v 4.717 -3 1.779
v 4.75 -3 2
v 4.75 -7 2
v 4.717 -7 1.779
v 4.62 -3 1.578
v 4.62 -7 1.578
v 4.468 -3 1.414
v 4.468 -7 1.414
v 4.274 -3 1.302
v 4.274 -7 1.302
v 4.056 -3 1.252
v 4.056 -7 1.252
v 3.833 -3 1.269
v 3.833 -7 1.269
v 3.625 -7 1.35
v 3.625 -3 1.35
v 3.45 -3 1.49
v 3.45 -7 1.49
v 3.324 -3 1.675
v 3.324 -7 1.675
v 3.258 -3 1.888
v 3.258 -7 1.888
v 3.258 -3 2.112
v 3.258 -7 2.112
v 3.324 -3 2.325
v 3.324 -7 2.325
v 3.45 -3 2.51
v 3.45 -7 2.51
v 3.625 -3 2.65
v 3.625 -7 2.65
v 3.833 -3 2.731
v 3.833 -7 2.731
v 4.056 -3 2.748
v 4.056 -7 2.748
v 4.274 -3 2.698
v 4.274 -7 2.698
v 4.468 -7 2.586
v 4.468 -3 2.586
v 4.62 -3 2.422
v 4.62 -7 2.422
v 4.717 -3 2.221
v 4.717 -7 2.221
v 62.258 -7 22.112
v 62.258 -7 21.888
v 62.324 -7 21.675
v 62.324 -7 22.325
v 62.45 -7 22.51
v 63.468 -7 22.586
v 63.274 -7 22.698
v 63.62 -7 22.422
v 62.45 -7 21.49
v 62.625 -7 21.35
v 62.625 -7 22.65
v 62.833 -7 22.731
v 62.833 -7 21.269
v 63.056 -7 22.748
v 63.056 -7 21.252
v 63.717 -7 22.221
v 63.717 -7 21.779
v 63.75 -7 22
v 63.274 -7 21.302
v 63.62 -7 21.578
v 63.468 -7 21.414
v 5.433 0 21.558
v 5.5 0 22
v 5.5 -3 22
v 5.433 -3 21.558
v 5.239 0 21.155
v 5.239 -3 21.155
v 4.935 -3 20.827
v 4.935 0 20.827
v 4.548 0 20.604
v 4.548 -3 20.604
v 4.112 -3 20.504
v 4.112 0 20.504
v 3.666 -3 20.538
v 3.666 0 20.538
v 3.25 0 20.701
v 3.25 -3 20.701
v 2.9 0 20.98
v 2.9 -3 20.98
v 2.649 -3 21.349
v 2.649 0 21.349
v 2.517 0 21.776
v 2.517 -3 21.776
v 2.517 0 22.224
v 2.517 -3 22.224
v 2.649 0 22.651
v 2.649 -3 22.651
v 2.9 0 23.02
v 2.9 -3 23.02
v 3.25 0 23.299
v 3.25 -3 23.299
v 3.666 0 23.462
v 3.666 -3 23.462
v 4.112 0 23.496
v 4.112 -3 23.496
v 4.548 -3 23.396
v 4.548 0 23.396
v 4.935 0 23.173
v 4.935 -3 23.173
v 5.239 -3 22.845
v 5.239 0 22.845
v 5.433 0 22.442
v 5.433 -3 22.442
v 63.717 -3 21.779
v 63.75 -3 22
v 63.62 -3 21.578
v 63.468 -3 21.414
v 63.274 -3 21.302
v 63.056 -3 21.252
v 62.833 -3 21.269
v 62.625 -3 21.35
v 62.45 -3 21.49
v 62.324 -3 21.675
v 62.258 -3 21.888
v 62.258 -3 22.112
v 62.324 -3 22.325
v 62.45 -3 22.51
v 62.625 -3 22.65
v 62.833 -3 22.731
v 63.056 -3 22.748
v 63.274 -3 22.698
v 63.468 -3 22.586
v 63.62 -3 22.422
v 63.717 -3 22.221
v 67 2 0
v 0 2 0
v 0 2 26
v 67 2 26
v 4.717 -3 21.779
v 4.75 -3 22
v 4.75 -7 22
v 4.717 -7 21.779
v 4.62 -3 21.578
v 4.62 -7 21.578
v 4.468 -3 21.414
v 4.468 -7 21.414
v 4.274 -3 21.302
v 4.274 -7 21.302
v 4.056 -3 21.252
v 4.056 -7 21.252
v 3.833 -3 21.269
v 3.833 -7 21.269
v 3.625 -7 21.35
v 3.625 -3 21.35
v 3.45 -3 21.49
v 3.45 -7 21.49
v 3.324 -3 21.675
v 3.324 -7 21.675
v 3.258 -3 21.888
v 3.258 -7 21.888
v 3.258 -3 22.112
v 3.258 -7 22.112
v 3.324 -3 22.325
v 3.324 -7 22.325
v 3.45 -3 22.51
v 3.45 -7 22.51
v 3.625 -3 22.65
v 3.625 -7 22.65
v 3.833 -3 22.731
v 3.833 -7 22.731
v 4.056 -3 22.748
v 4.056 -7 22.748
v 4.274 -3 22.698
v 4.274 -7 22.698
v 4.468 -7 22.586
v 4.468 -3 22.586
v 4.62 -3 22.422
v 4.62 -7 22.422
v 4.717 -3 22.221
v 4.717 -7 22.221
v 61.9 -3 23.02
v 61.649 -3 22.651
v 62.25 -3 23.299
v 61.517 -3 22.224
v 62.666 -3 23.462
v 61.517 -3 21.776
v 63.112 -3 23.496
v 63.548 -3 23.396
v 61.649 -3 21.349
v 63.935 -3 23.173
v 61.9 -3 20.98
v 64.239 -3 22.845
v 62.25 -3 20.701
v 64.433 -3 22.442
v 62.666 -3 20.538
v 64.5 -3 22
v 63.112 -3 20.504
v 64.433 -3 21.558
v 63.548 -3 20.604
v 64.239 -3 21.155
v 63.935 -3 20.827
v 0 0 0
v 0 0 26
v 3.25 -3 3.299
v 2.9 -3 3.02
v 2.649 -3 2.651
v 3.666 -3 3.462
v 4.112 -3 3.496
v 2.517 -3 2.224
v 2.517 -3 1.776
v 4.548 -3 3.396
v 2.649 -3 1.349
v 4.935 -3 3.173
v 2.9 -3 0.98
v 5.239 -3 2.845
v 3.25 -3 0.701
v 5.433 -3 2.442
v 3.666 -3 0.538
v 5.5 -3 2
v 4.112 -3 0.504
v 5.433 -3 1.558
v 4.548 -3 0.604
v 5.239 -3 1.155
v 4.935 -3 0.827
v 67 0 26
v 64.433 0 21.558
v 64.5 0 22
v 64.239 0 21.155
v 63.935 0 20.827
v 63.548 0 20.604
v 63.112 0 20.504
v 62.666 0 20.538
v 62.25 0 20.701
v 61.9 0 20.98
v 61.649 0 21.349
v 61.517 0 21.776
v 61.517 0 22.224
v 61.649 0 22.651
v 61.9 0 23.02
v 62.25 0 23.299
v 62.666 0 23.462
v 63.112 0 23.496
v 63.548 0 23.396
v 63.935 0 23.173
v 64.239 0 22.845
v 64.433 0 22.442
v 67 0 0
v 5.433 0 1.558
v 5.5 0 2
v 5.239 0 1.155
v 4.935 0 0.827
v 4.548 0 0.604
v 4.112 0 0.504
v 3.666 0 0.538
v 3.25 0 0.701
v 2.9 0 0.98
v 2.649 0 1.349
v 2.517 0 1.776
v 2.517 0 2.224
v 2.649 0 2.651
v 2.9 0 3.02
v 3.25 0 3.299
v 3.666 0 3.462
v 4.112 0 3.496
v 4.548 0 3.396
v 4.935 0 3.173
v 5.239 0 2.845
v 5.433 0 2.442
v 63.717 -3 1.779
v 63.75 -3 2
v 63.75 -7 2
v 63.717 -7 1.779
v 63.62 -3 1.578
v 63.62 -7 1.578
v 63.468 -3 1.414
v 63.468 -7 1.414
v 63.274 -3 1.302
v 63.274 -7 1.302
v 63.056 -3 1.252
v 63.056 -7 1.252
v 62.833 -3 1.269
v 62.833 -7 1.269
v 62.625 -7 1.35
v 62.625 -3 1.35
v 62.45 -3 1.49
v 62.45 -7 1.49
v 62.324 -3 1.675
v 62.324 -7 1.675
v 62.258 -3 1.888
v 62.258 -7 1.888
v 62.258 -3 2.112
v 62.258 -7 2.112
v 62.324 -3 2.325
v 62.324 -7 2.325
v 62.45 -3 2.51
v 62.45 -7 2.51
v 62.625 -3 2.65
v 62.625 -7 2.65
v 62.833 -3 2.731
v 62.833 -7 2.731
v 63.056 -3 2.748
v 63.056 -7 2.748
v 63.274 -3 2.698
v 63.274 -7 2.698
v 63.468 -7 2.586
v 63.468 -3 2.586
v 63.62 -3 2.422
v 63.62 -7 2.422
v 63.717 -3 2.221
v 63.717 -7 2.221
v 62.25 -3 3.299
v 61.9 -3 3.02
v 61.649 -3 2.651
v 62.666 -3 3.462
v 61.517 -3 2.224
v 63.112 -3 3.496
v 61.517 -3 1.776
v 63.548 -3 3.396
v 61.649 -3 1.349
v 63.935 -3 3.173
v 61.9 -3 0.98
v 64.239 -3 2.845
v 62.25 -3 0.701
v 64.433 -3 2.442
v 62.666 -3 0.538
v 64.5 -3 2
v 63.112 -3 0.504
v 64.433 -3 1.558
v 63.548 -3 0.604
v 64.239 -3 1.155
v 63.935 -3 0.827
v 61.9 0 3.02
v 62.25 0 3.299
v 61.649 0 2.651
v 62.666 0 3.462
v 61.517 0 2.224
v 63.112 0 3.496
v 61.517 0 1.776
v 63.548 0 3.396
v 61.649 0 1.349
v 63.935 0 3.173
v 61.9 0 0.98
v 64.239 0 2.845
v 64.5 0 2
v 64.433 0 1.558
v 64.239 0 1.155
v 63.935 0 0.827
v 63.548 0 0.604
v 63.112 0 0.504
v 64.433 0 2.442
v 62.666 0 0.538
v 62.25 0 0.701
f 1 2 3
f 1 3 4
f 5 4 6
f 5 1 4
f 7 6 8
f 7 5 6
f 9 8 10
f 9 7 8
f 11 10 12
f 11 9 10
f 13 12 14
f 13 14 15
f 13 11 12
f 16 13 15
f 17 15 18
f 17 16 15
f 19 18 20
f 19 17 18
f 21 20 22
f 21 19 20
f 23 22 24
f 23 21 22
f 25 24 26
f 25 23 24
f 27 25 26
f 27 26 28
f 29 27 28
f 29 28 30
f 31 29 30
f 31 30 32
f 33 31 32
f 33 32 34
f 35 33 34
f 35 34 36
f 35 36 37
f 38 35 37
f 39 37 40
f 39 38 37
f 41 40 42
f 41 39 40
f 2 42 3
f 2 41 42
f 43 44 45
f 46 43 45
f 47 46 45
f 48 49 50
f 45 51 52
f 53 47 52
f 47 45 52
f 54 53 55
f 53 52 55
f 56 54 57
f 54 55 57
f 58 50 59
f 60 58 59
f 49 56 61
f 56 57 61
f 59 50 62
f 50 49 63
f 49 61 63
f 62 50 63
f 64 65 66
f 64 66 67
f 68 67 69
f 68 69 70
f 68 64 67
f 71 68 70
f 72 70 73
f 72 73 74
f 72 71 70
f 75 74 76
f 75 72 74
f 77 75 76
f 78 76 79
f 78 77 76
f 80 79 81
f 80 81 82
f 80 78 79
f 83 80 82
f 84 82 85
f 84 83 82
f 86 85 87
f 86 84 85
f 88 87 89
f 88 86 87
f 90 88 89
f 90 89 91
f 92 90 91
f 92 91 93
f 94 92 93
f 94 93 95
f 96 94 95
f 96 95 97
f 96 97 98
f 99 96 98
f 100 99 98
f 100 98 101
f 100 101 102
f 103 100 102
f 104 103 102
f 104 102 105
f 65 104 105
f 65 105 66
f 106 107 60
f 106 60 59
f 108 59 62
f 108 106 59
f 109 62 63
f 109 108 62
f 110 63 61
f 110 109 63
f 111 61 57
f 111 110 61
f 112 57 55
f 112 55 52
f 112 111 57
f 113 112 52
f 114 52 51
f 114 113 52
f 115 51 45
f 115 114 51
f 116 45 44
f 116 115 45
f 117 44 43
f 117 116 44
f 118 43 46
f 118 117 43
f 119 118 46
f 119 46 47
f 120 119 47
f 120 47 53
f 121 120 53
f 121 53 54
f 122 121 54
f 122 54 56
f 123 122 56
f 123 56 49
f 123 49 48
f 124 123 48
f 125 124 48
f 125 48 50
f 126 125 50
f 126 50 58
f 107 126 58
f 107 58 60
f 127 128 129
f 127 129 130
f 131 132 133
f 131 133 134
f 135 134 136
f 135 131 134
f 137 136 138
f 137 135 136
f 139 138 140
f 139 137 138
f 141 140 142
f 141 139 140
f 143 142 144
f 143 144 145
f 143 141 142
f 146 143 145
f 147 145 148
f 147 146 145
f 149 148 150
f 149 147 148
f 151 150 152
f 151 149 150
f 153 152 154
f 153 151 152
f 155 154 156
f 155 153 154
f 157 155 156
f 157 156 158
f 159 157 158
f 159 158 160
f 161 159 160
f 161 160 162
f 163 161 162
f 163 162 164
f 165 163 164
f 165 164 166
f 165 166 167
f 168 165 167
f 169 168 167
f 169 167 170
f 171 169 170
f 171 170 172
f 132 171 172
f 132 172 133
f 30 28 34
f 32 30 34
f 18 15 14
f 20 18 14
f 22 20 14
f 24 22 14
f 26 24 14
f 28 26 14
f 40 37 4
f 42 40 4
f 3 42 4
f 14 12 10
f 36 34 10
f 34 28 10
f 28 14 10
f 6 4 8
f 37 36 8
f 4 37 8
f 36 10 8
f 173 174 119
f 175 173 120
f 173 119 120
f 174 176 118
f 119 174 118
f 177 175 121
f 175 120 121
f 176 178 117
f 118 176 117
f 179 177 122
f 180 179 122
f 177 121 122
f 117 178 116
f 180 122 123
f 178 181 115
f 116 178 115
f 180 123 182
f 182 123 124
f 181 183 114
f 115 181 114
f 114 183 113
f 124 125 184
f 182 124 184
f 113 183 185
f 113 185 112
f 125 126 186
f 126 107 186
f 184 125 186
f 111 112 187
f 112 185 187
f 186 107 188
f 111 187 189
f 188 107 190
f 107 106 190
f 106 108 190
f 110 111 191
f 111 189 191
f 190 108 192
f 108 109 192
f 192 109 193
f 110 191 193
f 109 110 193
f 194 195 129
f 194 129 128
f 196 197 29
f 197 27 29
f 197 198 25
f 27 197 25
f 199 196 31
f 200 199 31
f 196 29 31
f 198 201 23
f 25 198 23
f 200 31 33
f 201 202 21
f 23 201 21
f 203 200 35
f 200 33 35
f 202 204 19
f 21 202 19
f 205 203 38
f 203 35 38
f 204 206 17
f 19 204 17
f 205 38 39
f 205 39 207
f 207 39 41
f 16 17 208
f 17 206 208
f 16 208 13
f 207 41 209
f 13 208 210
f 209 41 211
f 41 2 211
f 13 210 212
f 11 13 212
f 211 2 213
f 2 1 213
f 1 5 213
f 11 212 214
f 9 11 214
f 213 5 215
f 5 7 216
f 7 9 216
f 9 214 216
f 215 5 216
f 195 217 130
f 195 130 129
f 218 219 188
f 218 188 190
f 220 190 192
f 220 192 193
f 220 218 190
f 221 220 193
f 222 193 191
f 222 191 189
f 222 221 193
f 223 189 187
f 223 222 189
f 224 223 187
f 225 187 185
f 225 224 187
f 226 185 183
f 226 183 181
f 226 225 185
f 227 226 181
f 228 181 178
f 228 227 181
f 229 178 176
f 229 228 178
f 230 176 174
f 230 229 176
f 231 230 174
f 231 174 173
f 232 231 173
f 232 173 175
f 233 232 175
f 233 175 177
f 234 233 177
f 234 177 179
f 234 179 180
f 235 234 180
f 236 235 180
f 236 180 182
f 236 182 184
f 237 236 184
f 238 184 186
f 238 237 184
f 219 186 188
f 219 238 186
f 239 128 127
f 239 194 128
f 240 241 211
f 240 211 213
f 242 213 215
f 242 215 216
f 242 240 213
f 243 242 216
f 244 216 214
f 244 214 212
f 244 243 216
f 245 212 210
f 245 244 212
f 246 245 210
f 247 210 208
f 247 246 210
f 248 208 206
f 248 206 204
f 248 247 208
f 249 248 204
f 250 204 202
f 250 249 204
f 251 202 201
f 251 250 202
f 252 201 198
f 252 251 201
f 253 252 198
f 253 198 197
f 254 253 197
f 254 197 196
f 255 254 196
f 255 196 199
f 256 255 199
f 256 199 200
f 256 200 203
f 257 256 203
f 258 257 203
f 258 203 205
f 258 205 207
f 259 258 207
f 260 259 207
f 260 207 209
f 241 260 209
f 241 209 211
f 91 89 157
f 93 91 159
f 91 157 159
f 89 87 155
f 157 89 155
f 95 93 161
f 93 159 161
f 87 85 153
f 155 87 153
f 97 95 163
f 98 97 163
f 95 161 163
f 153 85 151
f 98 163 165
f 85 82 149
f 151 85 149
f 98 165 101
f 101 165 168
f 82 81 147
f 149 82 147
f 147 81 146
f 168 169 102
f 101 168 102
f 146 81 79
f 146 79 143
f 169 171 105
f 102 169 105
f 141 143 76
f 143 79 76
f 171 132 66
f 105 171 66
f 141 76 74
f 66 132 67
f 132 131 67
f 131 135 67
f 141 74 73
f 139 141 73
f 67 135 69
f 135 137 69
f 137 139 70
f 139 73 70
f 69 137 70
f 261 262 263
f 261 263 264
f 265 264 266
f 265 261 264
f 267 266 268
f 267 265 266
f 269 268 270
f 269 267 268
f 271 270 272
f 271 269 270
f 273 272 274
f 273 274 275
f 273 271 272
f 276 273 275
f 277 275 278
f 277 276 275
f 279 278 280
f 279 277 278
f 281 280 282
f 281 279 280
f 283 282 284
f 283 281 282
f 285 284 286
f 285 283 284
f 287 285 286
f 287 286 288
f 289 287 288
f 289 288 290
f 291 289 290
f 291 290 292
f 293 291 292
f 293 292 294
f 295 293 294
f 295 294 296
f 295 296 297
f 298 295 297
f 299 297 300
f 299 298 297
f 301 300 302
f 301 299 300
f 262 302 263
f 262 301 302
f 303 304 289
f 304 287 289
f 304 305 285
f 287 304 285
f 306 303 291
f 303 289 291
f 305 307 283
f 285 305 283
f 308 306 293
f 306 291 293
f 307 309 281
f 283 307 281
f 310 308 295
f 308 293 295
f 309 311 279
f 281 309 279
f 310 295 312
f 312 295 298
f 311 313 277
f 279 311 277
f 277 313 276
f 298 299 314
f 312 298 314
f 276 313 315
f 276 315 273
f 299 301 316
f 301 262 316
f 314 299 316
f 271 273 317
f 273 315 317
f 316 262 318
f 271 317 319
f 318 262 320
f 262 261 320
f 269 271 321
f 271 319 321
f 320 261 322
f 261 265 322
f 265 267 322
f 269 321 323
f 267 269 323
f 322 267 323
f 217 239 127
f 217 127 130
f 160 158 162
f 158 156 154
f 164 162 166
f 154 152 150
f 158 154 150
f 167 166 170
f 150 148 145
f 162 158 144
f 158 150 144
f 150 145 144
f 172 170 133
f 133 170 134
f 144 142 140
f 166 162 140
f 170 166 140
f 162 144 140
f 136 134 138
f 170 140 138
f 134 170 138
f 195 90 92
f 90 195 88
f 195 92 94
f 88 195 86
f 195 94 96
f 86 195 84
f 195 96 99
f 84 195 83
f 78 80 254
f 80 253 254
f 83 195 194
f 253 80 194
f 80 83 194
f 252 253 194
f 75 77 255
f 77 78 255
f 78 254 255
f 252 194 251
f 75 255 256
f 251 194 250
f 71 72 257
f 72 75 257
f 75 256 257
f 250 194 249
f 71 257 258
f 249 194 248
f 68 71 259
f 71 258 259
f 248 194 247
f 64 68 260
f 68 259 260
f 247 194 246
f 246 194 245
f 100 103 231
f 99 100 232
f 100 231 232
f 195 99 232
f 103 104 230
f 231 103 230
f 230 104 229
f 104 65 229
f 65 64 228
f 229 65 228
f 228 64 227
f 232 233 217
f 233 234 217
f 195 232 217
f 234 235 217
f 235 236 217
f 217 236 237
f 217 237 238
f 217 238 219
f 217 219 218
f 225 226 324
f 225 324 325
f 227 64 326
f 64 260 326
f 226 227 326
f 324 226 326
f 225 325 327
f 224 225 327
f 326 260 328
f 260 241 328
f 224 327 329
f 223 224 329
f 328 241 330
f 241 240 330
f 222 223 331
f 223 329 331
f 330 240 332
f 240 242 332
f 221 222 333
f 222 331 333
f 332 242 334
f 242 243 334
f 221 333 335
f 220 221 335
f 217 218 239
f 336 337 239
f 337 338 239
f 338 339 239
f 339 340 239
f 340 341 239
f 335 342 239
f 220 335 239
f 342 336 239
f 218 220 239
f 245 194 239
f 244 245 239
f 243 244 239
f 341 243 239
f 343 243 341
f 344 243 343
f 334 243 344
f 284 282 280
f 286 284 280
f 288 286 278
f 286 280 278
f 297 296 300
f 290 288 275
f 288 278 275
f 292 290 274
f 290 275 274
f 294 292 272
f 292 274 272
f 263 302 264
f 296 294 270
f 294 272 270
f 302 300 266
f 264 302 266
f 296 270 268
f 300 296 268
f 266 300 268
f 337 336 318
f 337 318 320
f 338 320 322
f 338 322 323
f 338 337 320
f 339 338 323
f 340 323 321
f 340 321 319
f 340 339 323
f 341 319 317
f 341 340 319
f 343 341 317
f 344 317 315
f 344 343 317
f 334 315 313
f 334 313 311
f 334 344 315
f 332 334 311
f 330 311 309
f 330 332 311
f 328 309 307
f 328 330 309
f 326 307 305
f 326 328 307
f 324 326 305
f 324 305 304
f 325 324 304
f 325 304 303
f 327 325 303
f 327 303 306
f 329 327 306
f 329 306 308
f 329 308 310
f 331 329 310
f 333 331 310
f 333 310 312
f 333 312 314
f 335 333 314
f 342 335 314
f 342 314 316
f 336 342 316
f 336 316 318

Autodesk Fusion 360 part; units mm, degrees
sketch "Sketch1" plane through (0, 0, 0) normal (0, 1, 0) x (1, 0, 0)
  line L0 (0, 0) -> (67, 0)
  line L1 (67, 0) -> (67, -26)
  line L2 (67, -26) -> (0, -26)
  line L3 (0, -26) -> (0, 0)
  dimension "d1" = 67
  dimension "d2" = 26
extrude "Extrude1" add sketch "Sketch1" along normal blind 2
sketch "Sketch2" plane through (0, 0, 0) normal (0, 1, 0) x (1, 0, 0)
  circle A0 centre (4, -2) radius 1.5
  circle A1 centre (63, -2) radius 1.5
  circle A2 centre (4, -22) radius 1.5
  circle A3 centre (63, -22) radius 1.5
  dimension "d5" = 3
  dimension "d6" = 3
  dimension "d7" = 3
  dimension "d8" = 3
extrude "Extrude2" add sketch "Sketch2" against normal blind 3
sketch "Sketch3" plane through (0, 0, 0) normal (0, 1, 0) x (1, 0, 0)
  circle A0 centre (4, -22) radius 0.75
  circle A1 centre (4, -2) radius 0.75
  circle A2 centre (63, -22) radius 0.75
  circle A3 centre (63, -2) radius 0.75
  dimension "d11" = 1.5
  dimension "d12" = 1.5
  dimension "d13" = 1.5
  dimension "d14" = 1.5
extrude "Extrude3" add sketch "Sketch3" against normal blind 7 contours A0
sketch "Sketch4" plane through (0, 0, 0) normal (0, 1, 0) x (1, 0, 0)
  circle A0 centre (4, -2) radius 0.75
  dimension "d17" = 1.5
extrude "Extrude4" add sketch "Sketch4" against normal blind 7
sketch "Sketch5" plane through (0, 0, 0) normal (0, 1, 0) x (1, 0, 0)
  circle A0 centre (63, -22) radius 0.75
  dimension "d20" = 1.5
extrude "Extrude5" add sketch "Sketch5" against normal blind 7
sketch "Sketch6" plane through (0, 0, 0) normal (0, 1, 0) x (1, 0, 0)
  circle A0 centre (63, -2) radius 0.75
  dimension "d23" = 1.5
extrude "Extrude6" add sketch "Sketch6" against normal blind 7
